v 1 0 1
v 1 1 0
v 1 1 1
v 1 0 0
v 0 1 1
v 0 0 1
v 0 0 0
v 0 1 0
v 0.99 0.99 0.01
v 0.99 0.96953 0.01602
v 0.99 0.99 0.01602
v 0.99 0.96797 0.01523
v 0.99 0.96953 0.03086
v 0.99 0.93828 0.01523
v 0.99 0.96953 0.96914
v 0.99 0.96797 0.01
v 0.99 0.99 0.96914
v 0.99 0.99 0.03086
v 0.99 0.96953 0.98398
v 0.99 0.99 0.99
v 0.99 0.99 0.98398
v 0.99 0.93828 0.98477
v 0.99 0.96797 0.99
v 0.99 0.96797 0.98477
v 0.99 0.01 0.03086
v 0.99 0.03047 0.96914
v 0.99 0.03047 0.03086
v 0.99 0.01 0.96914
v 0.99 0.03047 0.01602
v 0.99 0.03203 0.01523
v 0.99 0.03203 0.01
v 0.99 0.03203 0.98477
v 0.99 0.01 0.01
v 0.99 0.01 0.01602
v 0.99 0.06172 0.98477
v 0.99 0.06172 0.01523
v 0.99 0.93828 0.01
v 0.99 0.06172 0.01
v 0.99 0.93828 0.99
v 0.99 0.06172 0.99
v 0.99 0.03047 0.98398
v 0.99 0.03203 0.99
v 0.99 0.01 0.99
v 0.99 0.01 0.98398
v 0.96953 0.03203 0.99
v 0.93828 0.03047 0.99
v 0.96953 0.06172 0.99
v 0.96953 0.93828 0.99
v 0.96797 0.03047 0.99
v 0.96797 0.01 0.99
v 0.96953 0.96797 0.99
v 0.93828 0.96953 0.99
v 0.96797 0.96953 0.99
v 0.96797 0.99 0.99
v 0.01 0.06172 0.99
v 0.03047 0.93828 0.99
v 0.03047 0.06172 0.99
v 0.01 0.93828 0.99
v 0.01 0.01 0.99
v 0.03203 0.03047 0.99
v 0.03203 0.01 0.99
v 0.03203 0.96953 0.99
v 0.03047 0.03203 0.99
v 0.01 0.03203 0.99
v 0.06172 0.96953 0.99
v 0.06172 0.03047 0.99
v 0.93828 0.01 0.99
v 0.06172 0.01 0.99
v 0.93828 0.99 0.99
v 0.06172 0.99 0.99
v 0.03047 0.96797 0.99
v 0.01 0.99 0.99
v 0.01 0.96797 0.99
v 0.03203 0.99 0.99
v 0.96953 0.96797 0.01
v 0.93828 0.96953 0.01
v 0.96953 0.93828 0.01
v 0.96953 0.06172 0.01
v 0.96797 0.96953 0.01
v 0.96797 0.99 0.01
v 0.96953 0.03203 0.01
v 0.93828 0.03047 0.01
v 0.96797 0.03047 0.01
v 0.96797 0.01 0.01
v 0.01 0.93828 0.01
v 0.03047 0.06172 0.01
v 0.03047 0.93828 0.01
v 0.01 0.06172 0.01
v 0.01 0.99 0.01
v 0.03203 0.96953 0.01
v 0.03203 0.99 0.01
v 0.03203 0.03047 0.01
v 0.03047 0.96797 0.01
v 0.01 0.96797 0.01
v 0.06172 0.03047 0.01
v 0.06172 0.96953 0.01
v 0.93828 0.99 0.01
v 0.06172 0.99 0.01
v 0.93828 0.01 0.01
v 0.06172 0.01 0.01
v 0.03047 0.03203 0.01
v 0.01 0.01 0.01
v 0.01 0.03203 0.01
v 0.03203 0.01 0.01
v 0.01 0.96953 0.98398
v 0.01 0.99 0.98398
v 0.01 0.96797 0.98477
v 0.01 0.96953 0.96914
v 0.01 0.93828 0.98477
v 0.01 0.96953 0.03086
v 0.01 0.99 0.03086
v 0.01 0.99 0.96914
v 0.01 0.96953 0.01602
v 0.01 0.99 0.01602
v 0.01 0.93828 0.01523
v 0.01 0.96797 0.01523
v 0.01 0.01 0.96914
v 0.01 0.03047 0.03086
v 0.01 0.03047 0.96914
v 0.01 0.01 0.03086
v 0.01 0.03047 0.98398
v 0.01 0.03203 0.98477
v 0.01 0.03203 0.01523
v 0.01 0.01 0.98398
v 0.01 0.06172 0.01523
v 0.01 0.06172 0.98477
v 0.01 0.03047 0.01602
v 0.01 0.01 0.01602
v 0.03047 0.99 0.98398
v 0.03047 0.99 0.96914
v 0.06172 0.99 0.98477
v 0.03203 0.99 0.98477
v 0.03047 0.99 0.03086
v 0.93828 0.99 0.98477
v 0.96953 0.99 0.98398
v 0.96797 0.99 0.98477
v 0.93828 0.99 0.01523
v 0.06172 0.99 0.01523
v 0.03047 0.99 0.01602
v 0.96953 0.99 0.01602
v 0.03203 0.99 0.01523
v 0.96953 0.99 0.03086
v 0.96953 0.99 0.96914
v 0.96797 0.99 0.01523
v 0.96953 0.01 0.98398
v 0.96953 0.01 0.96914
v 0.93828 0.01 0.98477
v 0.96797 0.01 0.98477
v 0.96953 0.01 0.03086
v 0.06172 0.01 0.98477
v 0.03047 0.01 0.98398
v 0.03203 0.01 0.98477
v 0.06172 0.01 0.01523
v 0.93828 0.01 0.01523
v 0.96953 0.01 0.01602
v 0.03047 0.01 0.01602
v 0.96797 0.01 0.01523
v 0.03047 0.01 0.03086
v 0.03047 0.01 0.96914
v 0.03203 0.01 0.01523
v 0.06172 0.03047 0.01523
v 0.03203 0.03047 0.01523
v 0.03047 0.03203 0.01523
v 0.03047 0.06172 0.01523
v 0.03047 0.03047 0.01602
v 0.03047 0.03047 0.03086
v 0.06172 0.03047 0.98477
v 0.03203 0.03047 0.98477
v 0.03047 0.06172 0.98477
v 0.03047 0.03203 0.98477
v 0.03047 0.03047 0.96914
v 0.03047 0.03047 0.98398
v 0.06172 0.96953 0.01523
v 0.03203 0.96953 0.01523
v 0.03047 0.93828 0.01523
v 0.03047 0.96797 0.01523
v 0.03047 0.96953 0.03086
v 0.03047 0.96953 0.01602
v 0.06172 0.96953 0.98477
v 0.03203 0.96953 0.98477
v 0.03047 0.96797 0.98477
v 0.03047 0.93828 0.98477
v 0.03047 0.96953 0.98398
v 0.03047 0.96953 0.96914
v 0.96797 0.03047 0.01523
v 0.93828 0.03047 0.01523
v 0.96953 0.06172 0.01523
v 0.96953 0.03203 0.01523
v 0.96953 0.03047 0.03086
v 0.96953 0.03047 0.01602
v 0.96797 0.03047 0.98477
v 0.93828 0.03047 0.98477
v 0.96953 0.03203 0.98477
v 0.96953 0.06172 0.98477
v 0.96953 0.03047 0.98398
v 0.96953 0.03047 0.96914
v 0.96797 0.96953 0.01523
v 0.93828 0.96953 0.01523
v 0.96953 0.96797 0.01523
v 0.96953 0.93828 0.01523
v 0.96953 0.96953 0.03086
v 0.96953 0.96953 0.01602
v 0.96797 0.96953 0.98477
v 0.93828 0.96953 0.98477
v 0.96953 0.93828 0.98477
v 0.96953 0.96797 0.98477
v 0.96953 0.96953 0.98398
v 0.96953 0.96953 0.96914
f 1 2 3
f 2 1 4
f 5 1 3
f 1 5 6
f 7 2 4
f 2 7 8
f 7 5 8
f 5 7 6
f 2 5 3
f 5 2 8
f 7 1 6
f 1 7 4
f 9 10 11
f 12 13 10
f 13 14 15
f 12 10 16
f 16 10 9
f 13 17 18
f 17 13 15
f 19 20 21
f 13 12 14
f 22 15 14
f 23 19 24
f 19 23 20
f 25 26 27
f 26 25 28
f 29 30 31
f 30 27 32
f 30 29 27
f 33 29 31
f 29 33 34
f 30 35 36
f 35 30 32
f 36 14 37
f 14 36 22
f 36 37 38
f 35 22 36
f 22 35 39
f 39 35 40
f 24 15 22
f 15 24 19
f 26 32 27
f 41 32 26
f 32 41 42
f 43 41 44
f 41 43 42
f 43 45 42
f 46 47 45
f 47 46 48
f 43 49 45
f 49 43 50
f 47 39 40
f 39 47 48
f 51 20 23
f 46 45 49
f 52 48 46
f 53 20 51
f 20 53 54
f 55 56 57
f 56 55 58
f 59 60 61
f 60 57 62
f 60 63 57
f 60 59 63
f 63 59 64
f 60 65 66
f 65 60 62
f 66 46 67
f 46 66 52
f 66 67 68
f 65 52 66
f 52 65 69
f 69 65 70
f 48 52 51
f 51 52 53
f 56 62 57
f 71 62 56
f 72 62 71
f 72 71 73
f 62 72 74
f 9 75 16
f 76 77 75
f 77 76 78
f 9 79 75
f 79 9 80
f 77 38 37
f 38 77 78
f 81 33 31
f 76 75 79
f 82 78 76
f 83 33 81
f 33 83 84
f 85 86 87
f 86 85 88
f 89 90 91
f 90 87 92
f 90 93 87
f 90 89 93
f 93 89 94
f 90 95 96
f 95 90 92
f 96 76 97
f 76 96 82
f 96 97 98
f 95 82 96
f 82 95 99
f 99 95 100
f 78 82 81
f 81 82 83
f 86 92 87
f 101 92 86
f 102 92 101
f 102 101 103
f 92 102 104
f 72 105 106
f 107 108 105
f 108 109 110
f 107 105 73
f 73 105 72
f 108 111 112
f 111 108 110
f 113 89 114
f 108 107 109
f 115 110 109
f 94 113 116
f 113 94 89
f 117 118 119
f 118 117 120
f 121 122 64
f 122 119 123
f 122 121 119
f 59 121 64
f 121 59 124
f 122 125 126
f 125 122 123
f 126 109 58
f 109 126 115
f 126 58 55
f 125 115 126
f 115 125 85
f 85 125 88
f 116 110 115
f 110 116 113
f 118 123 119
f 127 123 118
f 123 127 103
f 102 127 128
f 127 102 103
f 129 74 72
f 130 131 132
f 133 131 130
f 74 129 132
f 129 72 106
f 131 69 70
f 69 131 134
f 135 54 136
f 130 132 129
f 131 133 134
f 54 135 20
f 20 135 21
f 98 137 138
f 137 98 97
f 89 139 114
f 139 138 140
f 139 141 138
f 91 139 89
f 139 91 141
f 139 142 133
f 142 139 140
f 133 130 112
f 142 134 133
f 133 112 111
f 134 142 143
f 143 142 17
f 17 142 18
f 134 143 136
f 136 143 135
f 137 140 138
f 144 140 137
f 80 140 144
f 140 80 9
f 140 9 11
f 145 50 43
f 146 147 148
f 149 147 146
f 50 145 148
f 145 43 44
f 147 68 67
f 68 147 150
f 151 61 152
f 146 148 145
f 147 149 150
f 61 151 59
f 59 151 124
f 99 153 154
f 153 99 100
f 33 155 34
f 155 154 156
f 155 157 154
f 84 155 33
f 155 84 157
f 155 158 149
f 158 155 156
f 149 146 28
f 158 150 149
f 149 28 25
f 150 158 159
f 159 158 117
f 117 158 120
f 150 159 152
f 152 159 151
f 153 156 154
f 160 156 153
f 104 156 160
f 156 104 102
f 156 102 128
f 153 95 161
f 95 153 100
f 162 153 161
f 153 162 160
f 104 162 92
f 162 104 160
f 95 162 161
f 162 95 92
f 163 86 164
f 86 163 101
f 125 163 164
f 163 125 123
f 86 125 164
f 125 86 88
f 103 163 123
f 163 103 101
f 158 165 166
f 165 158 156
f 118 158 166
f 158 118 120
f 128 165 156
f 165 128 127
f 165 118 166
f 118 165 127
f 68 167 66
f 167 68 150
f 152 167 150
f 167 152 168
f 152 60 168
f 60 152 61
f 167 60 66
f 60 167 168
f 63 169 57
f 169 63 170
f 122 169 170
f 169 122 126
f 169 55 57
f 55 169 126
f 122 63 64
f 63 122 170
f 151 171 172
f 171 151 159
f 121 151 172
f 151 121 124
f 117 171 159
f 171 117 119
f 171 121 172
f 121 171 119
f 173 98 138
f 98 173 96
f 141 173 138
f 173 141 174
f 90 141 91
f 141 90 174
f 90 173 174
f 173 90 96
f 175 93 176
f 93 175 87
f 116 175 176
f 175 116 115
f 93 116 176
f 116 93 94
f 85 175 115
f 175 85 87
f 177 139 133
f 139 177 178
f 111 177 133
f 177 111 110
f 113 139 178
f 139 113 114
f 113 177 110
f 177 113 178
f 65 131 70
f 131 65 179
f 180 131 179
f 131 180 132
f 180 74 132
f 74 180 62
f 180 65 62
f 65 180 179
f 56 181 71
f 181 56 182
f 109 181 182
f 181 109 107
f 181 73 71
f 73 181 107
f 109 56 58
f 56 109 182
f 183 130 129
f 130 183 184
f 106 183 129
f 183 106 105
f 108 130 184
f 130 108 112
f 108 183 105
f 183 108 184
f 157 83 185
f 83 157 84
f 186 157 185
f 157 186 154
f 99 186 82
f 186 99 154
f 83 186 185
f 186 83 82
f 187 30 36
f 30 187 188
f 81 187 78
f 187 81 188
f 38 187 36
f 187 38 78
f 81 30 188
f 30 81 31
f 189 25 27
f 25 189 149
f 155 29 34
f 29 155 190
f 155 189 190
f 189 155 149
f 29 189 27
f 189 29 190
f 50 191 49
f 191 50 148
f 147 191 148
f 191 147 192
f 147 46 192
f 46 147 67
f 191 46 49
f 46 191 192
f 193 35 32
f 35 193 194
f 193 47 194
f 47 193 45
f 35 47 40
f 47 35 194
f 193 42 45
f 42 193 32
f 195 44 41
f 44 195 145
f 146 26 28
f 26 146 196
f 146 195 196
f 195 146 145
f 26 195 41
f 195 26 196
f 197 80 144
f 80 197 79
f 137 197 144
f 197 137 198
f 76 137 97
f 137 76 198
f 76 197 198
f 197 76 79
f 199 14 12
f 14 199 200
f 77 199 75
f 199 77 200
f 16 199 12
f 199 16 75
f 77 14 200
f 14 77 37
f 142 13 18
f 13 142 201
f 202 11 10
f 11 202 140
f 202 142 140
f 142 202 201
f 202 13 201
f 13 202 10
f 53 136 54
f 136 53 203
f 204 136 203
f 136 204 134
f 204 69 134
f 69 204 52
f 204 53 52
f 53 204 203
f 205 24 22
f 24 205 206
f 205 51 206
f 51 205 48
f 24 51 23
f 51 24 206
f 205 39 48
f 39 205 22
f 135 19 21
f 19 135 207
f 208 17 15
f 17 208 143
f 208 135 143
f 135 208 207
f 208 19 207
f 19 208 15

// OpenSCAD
translate([0.046875, 0.015625, 0.0078125]) color([0.8867863658513233, 0.14262867802352086, 0.1775506105325496]) cube([0.0296875, 0.0296875, 0.01484375], center=true);
translate([0.015625, 0.046875, 0.0078125]) color([0.4533966283975037, 0.11028855012128713, 0.8492240194790207]) cube([0.0296875, 0.0296875, 0.01484375], center=true);
translate([0.015625, 0.015625, 0.0234375]) color([0.0516876682859958, 0.5076059746872839, 0.4350586599380144]) cube([0.0296875, 0.0296875, 0.01484375], center=true);
translate([0.046875, 0.015625, 0.9921875]) color([0.4700687399204253, 0.05126525694714068, 0.6400626986582579]) cube([0.0296875, 0.0296875, 0.01484375], center=true);
translate([0.015625, 0.046875, 0.9921875]) color([0.289740654238397, 0.3801099644794991, 0.4774460880642686]) cube([0.0296875, 0.0296875, 0.01484375], center=true);
translate([0.015625, 0.015625, 0.9765625]) color([0.2547105302088214, 0.09924223360105133, 0.0034286869413682197]) cube([0.0296875, 0.0296875, 0.01484375], center=true);
translate([0.046875, 0.984375, 0.0078125]) color([0.35544132542133133, 0.34260882934359715, 0.665156912835356]) cube([0.0296875, 0.0296875, 0.01484375], center=true);
translate([0.015625, 0.953125, 0.0078125]) color([0.8457546706205312, 0.43061025129797403, 0.428963299997525]) cube([0.0296875, 0.0296875, 0.01484375], center=true);
translate([0.015625, 0.984375, 0.0234375]) color([0.471983165944875, 0.9714323160653209, 0.04763662747320219]) cube([0.0296875, 0.0296875, 0.01484375], center=true);
translate([0.046875, 0.984375, 0.9921875]) color([0.6017048999912084, 0.4238608699583831, 0.4638000243525888]) cube([0.0296875, 0.0296875, 0.01484375], center=true);
translate([0.015625, 0.953125, 0.9921875]) color([0.7209222138626044, 0.34055156238440487, 0.1919764175902523]) cube([0.0296875, 0.0296875, 0.01484375], center=true);
translate([0.015625, 0.984375, 0.9765625]) color([0.14158894806865308, 0.5899031024545329, 0.5257452959268315]) cube([0.0296875, 0.0296875, 0.01484375], center=true);
translate([0.953125, 0.015625, 0.0078125]) color([0.5293619392238526, 0.2717738086130197, 0.43350643022672564]) cube([0.0296875, 0.0296875, 0.01484375], center=true);
translate([0.984375, 0.046875, 0.0078125]) color([0.10951792618518608, 0.6457589641388174, 0.555629739450527]) cube([0.0296875, 0.0296875, 0.01484375], center=true);
translate([0.984375, 0.015625, 0.0234375]) color([0.8843713118421606, 0.5325143757014608, 0.10679205625658095]) cube([0.0296875, 0.0296875, 0.01484375], center=true);
translate([0.953125, 0.015625, 0.9921875]) color([0.3597533196734405, 0.6023741358780677, 0.2657252079837189]) cube([0.0296875, 0.0296875, 0.01484375], center=true);
translate([0.984375, 0.046875, 0.9921875]) color([0.056605452109885435, 0.15774890372588113, 0.6822342344112733]) cube([0.0296875, 0.0296875, 0.01484375], center=true);
translate([0.984375, 0.015625, 0.9765625]) color([0.6385486773536957, 0.8518284829776026, 0.05317719068756355]) cube([0.0296875, 0.0296875, 0.01484375], center=true);
translate([0.953125, 0.984375, 0.0078125]) color([0.2792730795698338, 0.8368682945003642, 0.0735896246511123]) cube([0.0296875, 0.0296875, 0.01484375], center=true);
translate([0.984375, 0.953125, 0.0078125]) color([0.7542919116668277, 0.8125097602258278, 0.8331143953099667]) cube([0.0296875, 0.0296875, 0.01484375], center=true);
translate([0.984375, 0.984375, 0.0234375]) color([0.3663455080432986, 0.06198549414896348, 0.40728499819079567]) cube([0.0296875, 0.0296875, 0.01484375], center=true);
translate([0.953125, 0.984375, 0.9921875]) color([0.37225694310536406, 0.014470013095079448, 0.7501747129043461]) cube([0.0296875, 0.0296875, 0.01484375], center=true);
translate([0.984375, 0.953125, 0.9921875]) color([0.6752207381249609, 0.03967218970112496, 0.021403108366700896]) cube([0.0296875, 0.0296875, 0.01484375], center=true);
translate([0.984375, 0.984375, 0.9765625]) color([0.3464863538099766, 0.34260063402109475, 0.8635639297359081]) cube([0.0296875, 0.0296875, 0.01484375], center=true);
color([0.3,0.3,0.3,0.3]) difference() { cube([1,1,1]); translate([0.01,0.01,0.01]) cube([0.98,0.98,0.98]); }
